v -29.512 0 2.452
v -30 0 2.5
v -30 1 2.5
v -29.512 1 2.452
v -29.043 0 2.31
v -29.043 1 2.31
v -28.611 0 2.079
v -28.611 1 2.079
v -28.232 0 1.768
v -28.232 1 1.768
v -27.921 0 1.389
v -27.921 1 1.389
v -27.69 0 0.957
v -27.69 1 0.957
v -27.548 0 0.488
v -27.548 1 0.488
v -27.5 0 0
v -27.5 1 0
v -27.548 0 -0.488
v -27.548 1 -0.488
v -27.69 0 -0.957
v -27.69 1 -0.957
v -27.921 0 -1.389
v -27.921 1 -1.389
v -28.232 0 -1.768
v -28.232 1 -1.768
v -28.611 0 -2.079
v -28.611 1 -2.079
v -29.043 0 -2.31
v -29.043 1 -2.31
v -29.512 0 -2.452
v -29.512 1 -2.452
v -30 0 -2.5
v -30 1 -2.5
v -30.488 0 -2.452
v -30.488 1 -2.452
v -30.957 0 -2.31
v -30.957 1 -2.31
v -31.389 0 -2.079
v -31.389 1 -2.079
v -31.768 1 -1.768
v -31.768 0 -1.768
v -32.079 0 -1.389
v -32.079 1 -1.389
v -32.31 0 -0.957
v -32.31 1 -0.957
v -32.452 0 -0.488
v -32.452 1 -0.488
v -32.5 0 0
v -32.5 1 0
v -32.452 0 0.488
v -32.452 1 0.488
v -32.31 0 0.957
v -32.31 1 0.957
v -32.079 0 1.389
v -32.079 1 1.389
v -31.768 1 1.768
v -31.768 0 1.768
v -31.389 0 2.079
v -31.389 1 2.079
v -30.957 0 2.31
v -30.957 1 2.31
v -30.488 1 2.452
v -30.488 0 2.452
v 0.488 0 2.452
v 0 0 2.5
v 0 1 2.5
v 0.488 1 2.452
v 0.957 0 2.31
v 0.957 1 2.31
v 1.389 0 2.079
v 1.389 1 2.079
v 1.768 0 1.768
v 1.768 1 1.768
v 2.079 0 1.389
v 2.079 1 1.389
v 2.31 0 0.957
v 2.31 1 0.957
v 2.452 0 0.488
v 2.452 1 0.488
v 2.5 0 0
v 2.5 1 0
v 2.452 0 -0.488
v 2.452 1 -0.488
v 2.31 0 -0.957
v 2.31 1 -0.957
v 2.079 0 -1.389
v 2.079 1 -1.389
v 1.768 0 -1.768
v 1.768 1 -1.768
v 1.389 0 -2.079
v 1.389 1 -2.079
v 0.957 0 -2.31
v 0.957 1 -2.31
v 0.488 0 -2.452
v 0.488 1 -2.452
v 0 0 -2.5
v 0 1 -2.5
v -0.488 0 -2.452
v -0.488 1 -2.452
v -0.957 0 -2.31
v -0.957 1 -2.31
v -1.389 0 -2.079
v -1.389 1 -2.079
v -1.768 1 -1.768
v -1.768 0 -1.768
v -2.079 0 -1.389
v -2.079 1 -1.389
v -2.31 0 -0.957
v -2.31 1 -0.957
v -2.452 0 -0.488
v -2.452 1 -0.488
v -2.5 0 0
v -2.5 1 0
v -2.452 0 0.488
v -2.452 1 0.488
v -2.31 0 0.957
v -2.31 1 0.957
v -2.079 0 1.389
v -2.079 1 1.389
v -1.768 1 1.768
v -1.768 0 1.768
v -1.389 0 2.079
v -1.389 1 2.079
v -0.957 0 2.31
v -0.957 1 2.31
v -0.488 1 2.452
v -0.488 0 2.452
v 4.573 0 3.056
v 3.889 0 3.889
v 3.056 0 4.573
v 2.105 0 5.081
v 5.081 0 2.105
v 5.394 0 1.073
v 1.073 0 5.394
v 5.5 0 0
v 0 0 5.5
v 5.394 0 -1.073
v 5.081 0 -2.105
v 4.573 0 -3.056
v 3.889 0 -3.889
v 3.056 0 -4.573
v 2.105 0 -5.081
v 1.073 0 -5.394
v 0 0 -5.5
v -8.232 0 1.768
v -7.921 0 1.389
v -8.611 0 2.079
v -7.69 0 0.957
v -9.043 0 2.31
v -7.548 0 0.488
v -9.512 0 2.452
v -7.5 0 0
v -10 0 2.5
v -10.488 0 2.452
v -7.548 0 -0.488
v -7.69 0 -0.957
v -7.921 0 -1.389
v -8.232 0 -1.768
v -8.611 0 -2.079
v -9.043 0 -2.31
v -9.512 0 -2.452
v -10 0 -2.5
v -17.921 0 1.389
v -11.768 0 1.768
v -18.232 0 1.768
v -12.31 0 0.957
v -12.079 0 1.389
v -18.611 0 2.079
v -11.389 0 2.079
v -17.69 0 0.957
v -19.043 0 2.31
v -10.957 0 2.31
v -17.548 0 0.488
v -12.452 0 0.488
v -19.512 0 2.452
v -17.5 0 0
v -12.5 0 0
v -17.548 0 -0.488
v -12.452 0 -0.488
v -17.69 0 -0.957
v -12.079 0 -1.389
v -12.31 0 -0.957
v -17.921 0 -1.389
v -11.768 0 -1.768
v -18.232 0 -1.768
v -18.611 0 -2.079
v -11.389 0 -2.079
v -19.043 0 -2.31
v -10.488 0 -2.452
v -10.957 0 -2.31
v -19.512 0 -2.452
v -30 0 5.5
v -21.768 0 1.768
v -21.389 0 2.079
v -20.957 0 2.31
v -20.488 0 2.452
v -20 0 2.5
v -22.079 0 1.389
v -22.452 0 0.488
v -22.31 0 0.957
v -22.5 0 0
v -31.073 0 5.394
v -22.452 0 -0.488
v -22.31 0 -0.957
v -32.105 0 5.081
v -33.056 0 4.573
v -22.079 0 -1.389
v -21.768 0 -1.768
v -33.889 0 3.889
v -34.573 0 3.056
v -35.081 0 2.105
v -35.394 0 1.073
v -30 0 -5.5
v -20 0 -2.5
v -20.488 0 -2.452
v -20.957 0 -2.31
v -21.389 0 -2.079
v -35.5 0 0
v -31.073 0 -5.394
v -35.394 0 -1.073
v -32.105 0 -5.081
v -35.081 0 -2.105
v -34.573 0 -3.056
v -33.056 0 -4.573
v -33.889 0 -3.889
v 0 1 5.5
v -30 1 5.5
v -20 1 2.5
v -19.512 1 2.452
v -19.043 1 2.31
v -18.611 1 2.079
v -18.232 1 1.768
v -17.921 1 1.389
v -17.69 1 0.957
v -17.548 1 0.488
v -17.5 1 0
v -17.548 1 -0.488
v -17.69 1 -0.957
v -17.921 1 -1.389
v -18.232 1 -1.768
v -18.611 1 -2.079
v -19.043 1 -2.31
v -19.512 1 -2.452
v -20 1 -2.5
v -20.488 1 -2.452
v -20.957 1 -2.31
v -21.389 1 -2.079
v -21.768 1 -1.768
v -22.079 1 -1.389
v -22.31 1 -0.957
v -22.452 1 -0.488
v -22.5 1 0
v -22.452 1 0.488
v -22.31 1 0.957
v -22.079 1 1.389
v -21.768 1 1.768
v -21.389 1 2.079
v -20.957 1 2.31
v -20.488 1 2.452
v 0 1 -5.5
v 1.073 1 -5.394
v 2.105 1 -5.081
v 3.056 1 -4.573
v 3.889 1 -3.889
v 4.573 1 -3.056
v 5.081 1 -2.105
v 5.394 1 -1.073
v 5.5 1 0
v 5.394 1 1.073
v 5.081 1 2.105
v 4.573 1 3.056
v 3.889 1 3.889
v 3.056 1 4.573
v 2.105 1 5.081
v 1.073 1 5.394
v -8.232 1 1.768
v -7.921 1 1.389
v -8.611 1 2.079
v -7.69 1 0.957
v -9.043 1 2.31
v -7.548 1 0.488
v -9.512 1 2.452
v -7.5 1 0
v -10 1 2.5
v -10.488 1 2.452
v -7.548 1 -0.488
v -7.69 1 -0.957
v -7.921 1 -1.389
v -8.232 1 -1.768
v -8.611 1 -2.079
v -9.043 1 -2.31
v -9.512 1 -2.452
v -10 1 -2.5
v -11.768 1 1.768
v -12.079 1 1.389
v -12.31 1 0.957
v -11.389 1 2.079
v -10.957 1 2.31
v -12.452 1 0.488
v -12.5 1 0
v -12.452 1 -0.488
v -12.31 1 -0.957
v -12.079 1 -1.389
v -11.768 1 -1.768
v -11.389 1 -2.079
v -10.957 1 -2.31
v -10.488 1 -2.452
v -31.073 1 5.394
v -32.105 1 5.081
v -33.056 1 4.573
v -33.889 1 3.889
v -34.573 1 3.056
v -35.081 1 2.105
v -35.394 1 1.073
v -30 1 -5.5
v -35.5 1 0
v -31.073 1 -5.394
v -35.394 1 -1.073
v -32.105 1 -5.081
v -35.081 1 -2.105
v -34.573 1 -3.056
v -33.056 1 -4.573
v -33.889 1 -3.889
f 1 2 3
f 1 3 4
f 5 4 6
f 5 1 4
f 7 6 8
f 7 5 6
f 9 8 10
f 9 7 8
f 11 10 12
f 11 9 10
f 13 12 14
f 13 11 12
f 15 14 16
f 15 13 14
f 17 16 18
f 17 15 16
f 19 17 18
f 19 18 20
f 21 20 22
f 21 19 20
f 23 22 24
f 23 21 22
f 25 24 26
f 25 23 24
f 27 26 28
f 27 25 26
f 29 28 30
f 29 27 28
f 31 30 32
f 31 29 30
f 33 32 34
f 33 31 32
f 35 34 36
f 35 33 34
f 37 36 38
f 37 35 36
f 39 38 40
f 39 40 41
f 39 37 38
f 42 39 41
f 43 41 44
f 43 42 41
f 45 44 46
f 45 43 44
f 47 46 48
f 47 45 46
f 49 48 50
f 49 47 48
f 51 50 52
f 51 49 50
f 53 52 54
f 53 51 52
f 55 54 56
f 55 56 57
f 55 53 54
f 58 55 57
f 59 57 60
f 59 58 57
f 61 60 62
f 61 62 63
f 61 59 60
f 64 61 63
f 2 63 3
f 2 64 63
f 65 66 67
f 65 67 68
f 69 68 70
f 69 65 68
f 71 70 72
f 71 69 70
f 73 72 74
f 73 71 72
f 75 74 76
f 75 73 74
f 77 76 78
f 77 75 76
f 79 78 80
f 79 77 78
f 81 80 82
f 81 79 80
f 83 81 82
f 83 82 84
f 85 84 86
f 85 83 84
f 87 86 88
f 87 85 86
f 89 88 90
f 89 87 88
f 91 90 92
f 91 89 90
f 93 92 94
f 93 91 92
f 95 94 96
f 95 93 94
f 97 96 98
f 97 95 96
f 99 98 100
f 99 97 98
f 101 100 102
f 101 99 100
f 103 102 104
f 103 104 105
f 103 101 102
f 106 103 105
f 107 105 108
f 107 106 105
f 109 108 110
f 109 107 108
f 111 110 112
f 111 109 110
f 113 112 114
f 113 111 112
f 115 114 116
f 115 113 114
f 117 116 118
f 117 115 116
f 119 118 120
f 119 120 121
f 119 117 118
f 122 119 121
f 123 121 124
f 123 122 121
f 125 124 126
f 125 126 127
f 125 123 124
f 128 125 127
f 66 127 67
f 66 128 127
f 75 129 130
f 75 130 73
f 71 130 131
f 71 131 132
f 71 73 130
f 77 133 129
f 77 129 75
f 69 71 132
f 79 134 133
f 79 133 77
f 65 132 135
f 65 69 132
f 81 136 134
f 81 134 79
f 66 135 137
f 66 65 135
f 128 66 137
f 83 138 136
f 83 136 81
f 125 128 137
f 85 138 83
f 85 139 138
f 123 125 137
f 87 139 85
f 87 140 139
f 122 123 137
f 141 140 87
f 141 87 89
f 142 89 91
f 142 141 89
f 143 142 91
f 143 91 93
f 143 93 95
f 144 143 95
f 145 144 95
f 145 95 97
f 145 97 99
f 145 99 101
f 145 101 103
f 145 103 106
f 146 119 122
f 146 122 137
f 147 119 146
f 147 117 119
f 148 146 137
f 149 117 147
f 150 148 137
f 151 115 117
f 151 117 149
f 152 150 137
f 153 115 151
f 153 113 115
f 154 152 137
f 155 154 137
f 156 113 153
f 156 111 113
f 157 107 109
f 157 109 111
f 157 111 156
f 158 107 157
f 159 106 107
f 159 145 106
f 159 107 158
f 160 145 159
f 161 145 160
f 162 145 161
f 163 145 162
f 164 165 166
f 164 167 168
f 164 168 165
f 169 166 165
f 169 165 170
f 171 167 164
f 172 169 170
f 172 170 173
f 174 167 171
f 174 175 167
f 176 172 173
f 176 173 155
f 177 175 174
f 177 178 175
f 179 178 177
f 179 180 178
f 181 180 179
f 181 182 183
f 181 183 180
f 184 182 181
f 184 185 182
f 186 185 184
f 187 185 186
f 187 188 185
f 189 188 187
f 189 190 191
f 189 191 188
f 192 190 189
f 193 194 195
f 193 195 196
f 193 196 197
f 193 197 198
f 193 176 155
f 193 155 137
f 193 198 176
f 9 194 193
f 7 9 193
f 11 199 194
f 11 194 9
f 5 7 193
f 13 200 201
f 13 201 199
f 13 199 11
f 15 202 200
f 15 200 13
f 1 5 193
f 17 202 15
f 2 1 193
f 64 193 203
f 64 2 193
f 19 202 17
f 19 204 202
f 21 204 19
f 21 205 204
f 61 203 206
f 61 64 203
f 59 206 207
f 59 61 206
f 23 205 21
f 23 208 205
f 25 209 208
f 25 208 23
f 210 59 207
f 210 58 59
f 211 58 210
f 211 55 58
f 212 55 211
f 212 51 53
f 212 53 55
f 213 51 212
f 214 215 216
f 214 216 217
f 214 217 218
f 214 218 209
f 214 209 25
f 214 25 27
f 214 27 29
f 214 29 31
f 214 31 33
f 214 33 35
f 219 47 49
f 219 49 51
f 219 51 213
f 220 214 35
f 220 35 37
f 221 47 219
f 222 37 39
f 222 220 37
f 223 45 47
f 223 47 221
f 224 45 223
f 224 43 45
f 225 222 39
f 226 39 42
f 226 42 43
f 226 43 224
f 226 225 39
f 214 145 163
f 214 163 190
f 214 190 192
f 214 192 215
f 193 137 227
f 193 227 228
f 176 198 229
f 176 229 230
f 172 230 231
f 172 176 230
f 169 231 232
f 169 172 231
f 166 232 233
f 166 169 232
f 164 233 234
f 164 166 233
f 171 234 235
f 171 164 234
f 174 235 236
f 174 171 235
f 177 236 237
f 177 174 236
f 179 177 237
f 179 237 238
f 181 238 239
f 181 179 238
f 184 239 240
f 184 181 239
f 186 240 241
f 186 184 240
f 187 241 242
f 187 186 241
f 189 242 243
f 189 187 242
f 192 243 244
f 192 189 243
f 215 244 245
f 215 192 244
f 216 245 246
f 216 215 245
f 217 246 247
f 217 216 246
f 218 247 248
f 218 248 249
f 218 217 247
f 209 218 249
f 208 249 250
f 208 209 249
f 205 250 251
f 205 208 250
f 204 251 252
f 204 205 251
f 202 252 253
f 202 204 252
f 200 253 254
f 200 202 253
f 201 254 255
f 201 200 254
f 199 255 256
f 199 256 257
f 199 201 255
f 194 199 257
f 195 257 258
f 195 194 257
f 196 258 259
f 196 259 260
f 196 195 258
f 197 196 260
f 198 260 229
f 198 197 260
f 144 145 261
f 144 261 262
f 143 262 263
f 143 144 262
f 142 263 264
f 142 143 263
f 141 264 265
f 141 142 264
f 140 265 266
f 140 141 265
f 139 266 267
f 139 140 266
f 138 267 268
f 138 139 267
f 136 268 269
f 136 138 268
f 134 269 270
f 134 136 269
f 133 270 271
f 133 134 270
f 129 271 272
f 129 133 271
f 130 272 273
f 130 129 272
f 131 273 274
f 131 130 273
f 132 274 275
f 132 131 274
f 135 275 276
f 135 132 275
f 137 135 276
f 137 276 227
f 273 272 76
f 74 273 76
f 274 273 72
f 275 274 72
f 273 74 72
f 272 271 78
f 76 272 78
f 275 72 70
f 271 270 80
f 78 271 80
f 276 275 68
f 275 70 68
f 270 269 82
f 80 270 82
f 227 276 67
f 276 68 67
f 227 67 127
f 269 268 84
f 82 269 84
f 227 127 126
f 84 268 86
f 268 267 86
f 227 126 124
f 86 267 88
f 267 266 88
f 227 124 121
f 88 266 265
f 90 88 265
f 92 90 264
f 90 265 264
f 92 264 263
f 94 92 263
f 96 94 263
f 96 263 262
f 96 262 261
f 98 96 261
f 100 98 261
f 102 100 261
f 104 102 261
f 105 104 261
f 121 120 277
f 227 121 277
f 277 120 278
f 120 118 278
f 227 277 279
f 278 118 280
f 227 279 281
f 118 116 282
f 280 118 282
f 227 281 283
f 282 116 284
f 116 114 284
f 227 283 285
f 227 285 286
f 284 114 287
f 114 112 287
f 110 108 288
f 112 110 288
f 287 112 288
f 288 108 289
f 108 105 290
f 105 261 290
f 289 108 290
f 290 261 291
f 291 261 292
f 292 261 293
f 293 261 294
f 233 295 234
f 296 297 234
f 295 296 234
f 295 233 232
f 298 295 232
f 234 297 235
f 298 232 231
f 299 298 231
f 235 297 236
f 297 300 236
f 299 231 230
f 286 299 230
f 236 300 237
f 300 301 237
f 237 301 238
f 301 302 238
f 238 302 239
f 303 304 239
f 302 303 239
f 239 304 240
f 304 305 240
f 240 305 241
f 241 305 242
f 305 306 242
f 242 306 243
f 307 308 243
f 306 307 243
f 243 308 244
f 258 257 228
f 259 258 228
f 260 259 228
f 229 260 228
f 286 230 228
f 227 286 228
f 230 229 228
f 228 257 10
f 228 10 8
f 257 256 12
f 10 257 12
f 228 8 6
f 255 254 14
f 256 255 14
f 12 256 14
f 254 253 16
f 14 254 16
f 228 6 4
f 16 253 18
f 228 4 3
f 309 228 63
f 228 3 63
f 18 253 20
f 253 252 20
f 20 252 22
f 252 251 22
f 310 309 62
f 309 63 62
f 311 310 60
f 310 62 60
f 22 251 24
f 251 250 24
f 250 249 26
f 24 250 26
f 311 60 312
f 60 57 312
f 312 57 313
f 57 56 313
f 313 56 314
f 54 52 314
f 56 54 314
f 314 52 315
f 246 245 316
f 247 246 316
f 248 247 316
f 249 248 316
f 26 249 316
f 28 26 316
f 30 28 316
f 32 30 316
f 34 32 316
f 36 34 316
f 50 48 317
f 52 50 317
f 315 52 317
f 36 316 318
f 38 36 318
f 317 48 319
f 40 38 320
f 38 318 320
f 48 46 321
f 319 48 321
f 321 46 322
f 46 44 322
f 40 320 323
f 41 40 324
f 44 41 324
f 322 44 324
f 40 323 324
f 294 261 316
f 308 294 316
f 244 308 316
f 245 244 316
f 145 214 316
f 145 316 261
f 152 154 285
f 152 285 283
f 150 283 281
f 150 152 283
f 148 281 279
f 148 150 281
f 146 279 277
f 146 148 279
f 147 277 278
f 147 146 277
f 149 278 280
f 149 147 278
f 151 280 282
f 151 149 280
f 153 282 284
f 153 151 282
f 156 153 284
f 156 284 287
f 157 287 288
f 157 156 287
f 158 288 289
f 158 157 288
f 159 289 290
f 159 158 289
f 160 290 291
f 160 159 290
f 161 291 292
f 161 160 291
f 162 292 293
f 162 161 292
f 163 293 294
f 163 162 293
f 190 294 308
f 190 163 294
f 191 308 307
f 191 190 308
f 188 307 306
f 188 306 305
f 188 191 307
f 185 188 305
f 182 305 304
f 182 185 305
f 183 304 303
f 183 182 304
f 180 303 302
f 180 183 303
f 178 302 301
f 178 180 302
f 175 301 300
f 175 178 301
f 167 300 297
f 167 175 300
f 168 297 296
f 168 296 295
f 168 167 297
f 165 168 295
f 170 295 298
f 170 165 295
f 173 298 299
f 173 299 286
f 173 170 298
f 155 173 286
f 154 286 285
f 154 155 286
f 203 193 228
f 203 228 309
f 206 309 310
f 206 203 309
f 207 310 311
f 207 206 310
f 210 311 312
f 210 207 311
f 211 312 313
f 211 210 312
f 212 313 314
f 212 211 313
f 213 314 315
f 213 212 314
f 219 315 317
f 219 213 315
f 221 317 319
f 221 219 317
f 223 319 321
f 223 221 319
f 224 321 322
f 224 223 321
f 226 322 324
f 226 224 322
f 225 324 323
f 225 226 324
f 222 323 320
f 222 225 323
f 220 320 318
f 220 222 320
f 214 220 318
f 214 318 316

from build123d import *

# Parameters (mm, degrees)
SKIZZE1_R                       = 2.5
AUFSATZ_LINEAR_AUSTRAGEN1_DEPTH = 1


with BuildPart() as part:
    # Skizze1 → Aufsatz-Linear austragen1 (new body)
    with BuildSketch(Plane(origin=(0, 0, 0), x_dir=(1, 0, 0), z_dir=(0, 1, 0))):
        with BuildLine():
            Line((0, -5.5), (-30, -5.5))
            ThreePointArc((-30, -5.5), (-35.5, 0), (-30, 5.5))
            Line((-30, 5.5), (0, 5.5))
            ThreePointArc((0, 5.5), (5.5, 0), (0, -5.5))
        make_face()
        with Locations(Location((0, 0, 0), (0, 0, 270))):
            Circle(SKIZZE1_R, mode=Mode.SUBTRACT)
        with Locations(Location((-20, 0, 0), (0, 0, 270))):
            Circle(SKIZZE1_R, mode=Mode.SUBTRACT)
        with Locations(Location((-10, 0, 0), (0, 0, 270))):
            Circle(SKIZZE1_R, mode=Mode.SUBTRACT)
        with Locations(Location((-30, 0, 0), (0, 0, 270))):
            Circle(SKIZZE1_R, mode=Mode.SUBTRACT)
    extrude(amount=AUFSATZ_LINEAR_AUSTRAGEN1_DEPTH)


solid = part.part
